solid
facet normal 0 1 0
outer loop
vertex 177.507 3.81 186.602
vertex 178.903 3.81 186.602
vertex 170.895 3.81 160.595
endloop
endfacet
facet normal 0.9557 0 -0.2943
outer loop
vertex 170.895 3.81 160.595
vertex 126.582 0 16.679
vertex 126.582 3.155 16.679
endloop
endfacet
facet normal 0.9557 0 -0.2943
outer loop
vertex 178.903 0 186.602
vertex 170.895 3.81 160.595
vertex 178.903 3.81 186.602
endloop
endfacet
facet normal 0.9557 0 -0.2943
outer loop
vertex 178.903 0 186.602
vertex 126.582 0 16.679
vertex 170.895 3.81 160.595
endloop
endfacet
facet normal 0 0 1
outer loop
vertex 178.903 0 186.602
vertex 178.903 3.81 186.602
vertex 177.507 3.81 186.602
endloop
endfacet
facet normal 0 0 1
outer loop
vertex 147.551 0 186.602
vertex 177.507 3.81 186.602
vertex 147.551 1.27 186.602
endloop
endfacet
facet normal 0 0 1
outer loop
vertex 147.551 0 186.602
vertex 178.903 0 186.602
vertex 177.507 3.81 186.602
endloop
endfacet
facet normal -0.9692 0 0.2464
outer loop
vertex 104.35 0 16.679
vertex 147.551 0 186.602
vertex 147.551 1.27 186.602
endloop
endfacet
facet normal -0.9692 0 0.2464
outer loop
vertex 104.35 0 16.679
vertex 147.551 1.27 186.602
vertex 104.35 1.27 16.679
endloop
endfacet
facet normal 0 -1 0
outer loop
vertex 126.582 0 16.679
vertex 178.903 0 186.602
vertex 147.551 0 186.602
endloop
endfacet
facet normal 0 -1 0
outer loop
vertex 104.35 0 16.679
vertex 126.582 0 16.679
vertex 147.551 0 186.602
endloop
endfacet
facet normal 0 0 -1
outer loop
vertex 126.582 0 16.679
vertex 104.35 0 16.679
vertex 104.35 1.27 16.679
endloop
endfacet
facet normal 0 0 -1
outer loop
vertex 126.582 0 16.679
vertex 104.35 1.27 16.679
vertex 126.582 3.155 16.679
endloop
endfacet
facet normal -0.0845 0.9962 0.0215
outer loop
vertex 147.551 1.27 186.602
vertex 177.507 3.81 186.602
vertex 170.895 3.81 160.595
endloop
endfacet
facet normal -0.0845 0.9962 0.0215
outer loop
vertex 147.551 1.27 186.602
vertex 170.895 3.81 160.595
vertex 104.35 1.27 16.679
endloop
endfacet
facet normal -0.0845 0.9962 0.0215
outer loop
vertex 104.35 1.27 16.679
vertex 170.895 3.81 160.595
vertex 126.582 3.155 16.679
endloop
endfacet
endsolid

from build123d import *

# Parameters (mm, degrees)
BOSS_EXTRUDE1_DEPTH = 3.81
CHAMFER1_SIZE       = 2.54
CHAMFER1_SIZE2      = 29.032332849


with BuildPart() as part:
    # Sketch2 → Boss-Extrude1 (new body)
    with BuildSketch(Plane(origin=(0, 0, 0), x_dir=(1, 0, 0), z_dir=(0, 1, 0))):
        Polygon((126.581568969, -16.678776649), (178.902552059, -186.601969437), (147.550785663, -186.601969437), (104.349973937, -16.678776649), align=None)
    extrude(amount=BOSS_EXTRUDE1_DEPTH)

    # Chamfer1
    chamfer1_edges = [part.edges().sort_by_distance(p)[0] for p in [
        (125.9503798, 3.81, 101.640373043),
    ]]
    chamfer1_side = [part.faces().sort_by_distance(p)[0] for p in [
        (125.9503798, 1.905, 101.640373043),
    ]]
    chamfer(chamfer1_edges, length=CHAMFER1_SIZE, length2=CHAMFER1_SIZE2, reference=chamfer1_side[0])


solid = part.part
